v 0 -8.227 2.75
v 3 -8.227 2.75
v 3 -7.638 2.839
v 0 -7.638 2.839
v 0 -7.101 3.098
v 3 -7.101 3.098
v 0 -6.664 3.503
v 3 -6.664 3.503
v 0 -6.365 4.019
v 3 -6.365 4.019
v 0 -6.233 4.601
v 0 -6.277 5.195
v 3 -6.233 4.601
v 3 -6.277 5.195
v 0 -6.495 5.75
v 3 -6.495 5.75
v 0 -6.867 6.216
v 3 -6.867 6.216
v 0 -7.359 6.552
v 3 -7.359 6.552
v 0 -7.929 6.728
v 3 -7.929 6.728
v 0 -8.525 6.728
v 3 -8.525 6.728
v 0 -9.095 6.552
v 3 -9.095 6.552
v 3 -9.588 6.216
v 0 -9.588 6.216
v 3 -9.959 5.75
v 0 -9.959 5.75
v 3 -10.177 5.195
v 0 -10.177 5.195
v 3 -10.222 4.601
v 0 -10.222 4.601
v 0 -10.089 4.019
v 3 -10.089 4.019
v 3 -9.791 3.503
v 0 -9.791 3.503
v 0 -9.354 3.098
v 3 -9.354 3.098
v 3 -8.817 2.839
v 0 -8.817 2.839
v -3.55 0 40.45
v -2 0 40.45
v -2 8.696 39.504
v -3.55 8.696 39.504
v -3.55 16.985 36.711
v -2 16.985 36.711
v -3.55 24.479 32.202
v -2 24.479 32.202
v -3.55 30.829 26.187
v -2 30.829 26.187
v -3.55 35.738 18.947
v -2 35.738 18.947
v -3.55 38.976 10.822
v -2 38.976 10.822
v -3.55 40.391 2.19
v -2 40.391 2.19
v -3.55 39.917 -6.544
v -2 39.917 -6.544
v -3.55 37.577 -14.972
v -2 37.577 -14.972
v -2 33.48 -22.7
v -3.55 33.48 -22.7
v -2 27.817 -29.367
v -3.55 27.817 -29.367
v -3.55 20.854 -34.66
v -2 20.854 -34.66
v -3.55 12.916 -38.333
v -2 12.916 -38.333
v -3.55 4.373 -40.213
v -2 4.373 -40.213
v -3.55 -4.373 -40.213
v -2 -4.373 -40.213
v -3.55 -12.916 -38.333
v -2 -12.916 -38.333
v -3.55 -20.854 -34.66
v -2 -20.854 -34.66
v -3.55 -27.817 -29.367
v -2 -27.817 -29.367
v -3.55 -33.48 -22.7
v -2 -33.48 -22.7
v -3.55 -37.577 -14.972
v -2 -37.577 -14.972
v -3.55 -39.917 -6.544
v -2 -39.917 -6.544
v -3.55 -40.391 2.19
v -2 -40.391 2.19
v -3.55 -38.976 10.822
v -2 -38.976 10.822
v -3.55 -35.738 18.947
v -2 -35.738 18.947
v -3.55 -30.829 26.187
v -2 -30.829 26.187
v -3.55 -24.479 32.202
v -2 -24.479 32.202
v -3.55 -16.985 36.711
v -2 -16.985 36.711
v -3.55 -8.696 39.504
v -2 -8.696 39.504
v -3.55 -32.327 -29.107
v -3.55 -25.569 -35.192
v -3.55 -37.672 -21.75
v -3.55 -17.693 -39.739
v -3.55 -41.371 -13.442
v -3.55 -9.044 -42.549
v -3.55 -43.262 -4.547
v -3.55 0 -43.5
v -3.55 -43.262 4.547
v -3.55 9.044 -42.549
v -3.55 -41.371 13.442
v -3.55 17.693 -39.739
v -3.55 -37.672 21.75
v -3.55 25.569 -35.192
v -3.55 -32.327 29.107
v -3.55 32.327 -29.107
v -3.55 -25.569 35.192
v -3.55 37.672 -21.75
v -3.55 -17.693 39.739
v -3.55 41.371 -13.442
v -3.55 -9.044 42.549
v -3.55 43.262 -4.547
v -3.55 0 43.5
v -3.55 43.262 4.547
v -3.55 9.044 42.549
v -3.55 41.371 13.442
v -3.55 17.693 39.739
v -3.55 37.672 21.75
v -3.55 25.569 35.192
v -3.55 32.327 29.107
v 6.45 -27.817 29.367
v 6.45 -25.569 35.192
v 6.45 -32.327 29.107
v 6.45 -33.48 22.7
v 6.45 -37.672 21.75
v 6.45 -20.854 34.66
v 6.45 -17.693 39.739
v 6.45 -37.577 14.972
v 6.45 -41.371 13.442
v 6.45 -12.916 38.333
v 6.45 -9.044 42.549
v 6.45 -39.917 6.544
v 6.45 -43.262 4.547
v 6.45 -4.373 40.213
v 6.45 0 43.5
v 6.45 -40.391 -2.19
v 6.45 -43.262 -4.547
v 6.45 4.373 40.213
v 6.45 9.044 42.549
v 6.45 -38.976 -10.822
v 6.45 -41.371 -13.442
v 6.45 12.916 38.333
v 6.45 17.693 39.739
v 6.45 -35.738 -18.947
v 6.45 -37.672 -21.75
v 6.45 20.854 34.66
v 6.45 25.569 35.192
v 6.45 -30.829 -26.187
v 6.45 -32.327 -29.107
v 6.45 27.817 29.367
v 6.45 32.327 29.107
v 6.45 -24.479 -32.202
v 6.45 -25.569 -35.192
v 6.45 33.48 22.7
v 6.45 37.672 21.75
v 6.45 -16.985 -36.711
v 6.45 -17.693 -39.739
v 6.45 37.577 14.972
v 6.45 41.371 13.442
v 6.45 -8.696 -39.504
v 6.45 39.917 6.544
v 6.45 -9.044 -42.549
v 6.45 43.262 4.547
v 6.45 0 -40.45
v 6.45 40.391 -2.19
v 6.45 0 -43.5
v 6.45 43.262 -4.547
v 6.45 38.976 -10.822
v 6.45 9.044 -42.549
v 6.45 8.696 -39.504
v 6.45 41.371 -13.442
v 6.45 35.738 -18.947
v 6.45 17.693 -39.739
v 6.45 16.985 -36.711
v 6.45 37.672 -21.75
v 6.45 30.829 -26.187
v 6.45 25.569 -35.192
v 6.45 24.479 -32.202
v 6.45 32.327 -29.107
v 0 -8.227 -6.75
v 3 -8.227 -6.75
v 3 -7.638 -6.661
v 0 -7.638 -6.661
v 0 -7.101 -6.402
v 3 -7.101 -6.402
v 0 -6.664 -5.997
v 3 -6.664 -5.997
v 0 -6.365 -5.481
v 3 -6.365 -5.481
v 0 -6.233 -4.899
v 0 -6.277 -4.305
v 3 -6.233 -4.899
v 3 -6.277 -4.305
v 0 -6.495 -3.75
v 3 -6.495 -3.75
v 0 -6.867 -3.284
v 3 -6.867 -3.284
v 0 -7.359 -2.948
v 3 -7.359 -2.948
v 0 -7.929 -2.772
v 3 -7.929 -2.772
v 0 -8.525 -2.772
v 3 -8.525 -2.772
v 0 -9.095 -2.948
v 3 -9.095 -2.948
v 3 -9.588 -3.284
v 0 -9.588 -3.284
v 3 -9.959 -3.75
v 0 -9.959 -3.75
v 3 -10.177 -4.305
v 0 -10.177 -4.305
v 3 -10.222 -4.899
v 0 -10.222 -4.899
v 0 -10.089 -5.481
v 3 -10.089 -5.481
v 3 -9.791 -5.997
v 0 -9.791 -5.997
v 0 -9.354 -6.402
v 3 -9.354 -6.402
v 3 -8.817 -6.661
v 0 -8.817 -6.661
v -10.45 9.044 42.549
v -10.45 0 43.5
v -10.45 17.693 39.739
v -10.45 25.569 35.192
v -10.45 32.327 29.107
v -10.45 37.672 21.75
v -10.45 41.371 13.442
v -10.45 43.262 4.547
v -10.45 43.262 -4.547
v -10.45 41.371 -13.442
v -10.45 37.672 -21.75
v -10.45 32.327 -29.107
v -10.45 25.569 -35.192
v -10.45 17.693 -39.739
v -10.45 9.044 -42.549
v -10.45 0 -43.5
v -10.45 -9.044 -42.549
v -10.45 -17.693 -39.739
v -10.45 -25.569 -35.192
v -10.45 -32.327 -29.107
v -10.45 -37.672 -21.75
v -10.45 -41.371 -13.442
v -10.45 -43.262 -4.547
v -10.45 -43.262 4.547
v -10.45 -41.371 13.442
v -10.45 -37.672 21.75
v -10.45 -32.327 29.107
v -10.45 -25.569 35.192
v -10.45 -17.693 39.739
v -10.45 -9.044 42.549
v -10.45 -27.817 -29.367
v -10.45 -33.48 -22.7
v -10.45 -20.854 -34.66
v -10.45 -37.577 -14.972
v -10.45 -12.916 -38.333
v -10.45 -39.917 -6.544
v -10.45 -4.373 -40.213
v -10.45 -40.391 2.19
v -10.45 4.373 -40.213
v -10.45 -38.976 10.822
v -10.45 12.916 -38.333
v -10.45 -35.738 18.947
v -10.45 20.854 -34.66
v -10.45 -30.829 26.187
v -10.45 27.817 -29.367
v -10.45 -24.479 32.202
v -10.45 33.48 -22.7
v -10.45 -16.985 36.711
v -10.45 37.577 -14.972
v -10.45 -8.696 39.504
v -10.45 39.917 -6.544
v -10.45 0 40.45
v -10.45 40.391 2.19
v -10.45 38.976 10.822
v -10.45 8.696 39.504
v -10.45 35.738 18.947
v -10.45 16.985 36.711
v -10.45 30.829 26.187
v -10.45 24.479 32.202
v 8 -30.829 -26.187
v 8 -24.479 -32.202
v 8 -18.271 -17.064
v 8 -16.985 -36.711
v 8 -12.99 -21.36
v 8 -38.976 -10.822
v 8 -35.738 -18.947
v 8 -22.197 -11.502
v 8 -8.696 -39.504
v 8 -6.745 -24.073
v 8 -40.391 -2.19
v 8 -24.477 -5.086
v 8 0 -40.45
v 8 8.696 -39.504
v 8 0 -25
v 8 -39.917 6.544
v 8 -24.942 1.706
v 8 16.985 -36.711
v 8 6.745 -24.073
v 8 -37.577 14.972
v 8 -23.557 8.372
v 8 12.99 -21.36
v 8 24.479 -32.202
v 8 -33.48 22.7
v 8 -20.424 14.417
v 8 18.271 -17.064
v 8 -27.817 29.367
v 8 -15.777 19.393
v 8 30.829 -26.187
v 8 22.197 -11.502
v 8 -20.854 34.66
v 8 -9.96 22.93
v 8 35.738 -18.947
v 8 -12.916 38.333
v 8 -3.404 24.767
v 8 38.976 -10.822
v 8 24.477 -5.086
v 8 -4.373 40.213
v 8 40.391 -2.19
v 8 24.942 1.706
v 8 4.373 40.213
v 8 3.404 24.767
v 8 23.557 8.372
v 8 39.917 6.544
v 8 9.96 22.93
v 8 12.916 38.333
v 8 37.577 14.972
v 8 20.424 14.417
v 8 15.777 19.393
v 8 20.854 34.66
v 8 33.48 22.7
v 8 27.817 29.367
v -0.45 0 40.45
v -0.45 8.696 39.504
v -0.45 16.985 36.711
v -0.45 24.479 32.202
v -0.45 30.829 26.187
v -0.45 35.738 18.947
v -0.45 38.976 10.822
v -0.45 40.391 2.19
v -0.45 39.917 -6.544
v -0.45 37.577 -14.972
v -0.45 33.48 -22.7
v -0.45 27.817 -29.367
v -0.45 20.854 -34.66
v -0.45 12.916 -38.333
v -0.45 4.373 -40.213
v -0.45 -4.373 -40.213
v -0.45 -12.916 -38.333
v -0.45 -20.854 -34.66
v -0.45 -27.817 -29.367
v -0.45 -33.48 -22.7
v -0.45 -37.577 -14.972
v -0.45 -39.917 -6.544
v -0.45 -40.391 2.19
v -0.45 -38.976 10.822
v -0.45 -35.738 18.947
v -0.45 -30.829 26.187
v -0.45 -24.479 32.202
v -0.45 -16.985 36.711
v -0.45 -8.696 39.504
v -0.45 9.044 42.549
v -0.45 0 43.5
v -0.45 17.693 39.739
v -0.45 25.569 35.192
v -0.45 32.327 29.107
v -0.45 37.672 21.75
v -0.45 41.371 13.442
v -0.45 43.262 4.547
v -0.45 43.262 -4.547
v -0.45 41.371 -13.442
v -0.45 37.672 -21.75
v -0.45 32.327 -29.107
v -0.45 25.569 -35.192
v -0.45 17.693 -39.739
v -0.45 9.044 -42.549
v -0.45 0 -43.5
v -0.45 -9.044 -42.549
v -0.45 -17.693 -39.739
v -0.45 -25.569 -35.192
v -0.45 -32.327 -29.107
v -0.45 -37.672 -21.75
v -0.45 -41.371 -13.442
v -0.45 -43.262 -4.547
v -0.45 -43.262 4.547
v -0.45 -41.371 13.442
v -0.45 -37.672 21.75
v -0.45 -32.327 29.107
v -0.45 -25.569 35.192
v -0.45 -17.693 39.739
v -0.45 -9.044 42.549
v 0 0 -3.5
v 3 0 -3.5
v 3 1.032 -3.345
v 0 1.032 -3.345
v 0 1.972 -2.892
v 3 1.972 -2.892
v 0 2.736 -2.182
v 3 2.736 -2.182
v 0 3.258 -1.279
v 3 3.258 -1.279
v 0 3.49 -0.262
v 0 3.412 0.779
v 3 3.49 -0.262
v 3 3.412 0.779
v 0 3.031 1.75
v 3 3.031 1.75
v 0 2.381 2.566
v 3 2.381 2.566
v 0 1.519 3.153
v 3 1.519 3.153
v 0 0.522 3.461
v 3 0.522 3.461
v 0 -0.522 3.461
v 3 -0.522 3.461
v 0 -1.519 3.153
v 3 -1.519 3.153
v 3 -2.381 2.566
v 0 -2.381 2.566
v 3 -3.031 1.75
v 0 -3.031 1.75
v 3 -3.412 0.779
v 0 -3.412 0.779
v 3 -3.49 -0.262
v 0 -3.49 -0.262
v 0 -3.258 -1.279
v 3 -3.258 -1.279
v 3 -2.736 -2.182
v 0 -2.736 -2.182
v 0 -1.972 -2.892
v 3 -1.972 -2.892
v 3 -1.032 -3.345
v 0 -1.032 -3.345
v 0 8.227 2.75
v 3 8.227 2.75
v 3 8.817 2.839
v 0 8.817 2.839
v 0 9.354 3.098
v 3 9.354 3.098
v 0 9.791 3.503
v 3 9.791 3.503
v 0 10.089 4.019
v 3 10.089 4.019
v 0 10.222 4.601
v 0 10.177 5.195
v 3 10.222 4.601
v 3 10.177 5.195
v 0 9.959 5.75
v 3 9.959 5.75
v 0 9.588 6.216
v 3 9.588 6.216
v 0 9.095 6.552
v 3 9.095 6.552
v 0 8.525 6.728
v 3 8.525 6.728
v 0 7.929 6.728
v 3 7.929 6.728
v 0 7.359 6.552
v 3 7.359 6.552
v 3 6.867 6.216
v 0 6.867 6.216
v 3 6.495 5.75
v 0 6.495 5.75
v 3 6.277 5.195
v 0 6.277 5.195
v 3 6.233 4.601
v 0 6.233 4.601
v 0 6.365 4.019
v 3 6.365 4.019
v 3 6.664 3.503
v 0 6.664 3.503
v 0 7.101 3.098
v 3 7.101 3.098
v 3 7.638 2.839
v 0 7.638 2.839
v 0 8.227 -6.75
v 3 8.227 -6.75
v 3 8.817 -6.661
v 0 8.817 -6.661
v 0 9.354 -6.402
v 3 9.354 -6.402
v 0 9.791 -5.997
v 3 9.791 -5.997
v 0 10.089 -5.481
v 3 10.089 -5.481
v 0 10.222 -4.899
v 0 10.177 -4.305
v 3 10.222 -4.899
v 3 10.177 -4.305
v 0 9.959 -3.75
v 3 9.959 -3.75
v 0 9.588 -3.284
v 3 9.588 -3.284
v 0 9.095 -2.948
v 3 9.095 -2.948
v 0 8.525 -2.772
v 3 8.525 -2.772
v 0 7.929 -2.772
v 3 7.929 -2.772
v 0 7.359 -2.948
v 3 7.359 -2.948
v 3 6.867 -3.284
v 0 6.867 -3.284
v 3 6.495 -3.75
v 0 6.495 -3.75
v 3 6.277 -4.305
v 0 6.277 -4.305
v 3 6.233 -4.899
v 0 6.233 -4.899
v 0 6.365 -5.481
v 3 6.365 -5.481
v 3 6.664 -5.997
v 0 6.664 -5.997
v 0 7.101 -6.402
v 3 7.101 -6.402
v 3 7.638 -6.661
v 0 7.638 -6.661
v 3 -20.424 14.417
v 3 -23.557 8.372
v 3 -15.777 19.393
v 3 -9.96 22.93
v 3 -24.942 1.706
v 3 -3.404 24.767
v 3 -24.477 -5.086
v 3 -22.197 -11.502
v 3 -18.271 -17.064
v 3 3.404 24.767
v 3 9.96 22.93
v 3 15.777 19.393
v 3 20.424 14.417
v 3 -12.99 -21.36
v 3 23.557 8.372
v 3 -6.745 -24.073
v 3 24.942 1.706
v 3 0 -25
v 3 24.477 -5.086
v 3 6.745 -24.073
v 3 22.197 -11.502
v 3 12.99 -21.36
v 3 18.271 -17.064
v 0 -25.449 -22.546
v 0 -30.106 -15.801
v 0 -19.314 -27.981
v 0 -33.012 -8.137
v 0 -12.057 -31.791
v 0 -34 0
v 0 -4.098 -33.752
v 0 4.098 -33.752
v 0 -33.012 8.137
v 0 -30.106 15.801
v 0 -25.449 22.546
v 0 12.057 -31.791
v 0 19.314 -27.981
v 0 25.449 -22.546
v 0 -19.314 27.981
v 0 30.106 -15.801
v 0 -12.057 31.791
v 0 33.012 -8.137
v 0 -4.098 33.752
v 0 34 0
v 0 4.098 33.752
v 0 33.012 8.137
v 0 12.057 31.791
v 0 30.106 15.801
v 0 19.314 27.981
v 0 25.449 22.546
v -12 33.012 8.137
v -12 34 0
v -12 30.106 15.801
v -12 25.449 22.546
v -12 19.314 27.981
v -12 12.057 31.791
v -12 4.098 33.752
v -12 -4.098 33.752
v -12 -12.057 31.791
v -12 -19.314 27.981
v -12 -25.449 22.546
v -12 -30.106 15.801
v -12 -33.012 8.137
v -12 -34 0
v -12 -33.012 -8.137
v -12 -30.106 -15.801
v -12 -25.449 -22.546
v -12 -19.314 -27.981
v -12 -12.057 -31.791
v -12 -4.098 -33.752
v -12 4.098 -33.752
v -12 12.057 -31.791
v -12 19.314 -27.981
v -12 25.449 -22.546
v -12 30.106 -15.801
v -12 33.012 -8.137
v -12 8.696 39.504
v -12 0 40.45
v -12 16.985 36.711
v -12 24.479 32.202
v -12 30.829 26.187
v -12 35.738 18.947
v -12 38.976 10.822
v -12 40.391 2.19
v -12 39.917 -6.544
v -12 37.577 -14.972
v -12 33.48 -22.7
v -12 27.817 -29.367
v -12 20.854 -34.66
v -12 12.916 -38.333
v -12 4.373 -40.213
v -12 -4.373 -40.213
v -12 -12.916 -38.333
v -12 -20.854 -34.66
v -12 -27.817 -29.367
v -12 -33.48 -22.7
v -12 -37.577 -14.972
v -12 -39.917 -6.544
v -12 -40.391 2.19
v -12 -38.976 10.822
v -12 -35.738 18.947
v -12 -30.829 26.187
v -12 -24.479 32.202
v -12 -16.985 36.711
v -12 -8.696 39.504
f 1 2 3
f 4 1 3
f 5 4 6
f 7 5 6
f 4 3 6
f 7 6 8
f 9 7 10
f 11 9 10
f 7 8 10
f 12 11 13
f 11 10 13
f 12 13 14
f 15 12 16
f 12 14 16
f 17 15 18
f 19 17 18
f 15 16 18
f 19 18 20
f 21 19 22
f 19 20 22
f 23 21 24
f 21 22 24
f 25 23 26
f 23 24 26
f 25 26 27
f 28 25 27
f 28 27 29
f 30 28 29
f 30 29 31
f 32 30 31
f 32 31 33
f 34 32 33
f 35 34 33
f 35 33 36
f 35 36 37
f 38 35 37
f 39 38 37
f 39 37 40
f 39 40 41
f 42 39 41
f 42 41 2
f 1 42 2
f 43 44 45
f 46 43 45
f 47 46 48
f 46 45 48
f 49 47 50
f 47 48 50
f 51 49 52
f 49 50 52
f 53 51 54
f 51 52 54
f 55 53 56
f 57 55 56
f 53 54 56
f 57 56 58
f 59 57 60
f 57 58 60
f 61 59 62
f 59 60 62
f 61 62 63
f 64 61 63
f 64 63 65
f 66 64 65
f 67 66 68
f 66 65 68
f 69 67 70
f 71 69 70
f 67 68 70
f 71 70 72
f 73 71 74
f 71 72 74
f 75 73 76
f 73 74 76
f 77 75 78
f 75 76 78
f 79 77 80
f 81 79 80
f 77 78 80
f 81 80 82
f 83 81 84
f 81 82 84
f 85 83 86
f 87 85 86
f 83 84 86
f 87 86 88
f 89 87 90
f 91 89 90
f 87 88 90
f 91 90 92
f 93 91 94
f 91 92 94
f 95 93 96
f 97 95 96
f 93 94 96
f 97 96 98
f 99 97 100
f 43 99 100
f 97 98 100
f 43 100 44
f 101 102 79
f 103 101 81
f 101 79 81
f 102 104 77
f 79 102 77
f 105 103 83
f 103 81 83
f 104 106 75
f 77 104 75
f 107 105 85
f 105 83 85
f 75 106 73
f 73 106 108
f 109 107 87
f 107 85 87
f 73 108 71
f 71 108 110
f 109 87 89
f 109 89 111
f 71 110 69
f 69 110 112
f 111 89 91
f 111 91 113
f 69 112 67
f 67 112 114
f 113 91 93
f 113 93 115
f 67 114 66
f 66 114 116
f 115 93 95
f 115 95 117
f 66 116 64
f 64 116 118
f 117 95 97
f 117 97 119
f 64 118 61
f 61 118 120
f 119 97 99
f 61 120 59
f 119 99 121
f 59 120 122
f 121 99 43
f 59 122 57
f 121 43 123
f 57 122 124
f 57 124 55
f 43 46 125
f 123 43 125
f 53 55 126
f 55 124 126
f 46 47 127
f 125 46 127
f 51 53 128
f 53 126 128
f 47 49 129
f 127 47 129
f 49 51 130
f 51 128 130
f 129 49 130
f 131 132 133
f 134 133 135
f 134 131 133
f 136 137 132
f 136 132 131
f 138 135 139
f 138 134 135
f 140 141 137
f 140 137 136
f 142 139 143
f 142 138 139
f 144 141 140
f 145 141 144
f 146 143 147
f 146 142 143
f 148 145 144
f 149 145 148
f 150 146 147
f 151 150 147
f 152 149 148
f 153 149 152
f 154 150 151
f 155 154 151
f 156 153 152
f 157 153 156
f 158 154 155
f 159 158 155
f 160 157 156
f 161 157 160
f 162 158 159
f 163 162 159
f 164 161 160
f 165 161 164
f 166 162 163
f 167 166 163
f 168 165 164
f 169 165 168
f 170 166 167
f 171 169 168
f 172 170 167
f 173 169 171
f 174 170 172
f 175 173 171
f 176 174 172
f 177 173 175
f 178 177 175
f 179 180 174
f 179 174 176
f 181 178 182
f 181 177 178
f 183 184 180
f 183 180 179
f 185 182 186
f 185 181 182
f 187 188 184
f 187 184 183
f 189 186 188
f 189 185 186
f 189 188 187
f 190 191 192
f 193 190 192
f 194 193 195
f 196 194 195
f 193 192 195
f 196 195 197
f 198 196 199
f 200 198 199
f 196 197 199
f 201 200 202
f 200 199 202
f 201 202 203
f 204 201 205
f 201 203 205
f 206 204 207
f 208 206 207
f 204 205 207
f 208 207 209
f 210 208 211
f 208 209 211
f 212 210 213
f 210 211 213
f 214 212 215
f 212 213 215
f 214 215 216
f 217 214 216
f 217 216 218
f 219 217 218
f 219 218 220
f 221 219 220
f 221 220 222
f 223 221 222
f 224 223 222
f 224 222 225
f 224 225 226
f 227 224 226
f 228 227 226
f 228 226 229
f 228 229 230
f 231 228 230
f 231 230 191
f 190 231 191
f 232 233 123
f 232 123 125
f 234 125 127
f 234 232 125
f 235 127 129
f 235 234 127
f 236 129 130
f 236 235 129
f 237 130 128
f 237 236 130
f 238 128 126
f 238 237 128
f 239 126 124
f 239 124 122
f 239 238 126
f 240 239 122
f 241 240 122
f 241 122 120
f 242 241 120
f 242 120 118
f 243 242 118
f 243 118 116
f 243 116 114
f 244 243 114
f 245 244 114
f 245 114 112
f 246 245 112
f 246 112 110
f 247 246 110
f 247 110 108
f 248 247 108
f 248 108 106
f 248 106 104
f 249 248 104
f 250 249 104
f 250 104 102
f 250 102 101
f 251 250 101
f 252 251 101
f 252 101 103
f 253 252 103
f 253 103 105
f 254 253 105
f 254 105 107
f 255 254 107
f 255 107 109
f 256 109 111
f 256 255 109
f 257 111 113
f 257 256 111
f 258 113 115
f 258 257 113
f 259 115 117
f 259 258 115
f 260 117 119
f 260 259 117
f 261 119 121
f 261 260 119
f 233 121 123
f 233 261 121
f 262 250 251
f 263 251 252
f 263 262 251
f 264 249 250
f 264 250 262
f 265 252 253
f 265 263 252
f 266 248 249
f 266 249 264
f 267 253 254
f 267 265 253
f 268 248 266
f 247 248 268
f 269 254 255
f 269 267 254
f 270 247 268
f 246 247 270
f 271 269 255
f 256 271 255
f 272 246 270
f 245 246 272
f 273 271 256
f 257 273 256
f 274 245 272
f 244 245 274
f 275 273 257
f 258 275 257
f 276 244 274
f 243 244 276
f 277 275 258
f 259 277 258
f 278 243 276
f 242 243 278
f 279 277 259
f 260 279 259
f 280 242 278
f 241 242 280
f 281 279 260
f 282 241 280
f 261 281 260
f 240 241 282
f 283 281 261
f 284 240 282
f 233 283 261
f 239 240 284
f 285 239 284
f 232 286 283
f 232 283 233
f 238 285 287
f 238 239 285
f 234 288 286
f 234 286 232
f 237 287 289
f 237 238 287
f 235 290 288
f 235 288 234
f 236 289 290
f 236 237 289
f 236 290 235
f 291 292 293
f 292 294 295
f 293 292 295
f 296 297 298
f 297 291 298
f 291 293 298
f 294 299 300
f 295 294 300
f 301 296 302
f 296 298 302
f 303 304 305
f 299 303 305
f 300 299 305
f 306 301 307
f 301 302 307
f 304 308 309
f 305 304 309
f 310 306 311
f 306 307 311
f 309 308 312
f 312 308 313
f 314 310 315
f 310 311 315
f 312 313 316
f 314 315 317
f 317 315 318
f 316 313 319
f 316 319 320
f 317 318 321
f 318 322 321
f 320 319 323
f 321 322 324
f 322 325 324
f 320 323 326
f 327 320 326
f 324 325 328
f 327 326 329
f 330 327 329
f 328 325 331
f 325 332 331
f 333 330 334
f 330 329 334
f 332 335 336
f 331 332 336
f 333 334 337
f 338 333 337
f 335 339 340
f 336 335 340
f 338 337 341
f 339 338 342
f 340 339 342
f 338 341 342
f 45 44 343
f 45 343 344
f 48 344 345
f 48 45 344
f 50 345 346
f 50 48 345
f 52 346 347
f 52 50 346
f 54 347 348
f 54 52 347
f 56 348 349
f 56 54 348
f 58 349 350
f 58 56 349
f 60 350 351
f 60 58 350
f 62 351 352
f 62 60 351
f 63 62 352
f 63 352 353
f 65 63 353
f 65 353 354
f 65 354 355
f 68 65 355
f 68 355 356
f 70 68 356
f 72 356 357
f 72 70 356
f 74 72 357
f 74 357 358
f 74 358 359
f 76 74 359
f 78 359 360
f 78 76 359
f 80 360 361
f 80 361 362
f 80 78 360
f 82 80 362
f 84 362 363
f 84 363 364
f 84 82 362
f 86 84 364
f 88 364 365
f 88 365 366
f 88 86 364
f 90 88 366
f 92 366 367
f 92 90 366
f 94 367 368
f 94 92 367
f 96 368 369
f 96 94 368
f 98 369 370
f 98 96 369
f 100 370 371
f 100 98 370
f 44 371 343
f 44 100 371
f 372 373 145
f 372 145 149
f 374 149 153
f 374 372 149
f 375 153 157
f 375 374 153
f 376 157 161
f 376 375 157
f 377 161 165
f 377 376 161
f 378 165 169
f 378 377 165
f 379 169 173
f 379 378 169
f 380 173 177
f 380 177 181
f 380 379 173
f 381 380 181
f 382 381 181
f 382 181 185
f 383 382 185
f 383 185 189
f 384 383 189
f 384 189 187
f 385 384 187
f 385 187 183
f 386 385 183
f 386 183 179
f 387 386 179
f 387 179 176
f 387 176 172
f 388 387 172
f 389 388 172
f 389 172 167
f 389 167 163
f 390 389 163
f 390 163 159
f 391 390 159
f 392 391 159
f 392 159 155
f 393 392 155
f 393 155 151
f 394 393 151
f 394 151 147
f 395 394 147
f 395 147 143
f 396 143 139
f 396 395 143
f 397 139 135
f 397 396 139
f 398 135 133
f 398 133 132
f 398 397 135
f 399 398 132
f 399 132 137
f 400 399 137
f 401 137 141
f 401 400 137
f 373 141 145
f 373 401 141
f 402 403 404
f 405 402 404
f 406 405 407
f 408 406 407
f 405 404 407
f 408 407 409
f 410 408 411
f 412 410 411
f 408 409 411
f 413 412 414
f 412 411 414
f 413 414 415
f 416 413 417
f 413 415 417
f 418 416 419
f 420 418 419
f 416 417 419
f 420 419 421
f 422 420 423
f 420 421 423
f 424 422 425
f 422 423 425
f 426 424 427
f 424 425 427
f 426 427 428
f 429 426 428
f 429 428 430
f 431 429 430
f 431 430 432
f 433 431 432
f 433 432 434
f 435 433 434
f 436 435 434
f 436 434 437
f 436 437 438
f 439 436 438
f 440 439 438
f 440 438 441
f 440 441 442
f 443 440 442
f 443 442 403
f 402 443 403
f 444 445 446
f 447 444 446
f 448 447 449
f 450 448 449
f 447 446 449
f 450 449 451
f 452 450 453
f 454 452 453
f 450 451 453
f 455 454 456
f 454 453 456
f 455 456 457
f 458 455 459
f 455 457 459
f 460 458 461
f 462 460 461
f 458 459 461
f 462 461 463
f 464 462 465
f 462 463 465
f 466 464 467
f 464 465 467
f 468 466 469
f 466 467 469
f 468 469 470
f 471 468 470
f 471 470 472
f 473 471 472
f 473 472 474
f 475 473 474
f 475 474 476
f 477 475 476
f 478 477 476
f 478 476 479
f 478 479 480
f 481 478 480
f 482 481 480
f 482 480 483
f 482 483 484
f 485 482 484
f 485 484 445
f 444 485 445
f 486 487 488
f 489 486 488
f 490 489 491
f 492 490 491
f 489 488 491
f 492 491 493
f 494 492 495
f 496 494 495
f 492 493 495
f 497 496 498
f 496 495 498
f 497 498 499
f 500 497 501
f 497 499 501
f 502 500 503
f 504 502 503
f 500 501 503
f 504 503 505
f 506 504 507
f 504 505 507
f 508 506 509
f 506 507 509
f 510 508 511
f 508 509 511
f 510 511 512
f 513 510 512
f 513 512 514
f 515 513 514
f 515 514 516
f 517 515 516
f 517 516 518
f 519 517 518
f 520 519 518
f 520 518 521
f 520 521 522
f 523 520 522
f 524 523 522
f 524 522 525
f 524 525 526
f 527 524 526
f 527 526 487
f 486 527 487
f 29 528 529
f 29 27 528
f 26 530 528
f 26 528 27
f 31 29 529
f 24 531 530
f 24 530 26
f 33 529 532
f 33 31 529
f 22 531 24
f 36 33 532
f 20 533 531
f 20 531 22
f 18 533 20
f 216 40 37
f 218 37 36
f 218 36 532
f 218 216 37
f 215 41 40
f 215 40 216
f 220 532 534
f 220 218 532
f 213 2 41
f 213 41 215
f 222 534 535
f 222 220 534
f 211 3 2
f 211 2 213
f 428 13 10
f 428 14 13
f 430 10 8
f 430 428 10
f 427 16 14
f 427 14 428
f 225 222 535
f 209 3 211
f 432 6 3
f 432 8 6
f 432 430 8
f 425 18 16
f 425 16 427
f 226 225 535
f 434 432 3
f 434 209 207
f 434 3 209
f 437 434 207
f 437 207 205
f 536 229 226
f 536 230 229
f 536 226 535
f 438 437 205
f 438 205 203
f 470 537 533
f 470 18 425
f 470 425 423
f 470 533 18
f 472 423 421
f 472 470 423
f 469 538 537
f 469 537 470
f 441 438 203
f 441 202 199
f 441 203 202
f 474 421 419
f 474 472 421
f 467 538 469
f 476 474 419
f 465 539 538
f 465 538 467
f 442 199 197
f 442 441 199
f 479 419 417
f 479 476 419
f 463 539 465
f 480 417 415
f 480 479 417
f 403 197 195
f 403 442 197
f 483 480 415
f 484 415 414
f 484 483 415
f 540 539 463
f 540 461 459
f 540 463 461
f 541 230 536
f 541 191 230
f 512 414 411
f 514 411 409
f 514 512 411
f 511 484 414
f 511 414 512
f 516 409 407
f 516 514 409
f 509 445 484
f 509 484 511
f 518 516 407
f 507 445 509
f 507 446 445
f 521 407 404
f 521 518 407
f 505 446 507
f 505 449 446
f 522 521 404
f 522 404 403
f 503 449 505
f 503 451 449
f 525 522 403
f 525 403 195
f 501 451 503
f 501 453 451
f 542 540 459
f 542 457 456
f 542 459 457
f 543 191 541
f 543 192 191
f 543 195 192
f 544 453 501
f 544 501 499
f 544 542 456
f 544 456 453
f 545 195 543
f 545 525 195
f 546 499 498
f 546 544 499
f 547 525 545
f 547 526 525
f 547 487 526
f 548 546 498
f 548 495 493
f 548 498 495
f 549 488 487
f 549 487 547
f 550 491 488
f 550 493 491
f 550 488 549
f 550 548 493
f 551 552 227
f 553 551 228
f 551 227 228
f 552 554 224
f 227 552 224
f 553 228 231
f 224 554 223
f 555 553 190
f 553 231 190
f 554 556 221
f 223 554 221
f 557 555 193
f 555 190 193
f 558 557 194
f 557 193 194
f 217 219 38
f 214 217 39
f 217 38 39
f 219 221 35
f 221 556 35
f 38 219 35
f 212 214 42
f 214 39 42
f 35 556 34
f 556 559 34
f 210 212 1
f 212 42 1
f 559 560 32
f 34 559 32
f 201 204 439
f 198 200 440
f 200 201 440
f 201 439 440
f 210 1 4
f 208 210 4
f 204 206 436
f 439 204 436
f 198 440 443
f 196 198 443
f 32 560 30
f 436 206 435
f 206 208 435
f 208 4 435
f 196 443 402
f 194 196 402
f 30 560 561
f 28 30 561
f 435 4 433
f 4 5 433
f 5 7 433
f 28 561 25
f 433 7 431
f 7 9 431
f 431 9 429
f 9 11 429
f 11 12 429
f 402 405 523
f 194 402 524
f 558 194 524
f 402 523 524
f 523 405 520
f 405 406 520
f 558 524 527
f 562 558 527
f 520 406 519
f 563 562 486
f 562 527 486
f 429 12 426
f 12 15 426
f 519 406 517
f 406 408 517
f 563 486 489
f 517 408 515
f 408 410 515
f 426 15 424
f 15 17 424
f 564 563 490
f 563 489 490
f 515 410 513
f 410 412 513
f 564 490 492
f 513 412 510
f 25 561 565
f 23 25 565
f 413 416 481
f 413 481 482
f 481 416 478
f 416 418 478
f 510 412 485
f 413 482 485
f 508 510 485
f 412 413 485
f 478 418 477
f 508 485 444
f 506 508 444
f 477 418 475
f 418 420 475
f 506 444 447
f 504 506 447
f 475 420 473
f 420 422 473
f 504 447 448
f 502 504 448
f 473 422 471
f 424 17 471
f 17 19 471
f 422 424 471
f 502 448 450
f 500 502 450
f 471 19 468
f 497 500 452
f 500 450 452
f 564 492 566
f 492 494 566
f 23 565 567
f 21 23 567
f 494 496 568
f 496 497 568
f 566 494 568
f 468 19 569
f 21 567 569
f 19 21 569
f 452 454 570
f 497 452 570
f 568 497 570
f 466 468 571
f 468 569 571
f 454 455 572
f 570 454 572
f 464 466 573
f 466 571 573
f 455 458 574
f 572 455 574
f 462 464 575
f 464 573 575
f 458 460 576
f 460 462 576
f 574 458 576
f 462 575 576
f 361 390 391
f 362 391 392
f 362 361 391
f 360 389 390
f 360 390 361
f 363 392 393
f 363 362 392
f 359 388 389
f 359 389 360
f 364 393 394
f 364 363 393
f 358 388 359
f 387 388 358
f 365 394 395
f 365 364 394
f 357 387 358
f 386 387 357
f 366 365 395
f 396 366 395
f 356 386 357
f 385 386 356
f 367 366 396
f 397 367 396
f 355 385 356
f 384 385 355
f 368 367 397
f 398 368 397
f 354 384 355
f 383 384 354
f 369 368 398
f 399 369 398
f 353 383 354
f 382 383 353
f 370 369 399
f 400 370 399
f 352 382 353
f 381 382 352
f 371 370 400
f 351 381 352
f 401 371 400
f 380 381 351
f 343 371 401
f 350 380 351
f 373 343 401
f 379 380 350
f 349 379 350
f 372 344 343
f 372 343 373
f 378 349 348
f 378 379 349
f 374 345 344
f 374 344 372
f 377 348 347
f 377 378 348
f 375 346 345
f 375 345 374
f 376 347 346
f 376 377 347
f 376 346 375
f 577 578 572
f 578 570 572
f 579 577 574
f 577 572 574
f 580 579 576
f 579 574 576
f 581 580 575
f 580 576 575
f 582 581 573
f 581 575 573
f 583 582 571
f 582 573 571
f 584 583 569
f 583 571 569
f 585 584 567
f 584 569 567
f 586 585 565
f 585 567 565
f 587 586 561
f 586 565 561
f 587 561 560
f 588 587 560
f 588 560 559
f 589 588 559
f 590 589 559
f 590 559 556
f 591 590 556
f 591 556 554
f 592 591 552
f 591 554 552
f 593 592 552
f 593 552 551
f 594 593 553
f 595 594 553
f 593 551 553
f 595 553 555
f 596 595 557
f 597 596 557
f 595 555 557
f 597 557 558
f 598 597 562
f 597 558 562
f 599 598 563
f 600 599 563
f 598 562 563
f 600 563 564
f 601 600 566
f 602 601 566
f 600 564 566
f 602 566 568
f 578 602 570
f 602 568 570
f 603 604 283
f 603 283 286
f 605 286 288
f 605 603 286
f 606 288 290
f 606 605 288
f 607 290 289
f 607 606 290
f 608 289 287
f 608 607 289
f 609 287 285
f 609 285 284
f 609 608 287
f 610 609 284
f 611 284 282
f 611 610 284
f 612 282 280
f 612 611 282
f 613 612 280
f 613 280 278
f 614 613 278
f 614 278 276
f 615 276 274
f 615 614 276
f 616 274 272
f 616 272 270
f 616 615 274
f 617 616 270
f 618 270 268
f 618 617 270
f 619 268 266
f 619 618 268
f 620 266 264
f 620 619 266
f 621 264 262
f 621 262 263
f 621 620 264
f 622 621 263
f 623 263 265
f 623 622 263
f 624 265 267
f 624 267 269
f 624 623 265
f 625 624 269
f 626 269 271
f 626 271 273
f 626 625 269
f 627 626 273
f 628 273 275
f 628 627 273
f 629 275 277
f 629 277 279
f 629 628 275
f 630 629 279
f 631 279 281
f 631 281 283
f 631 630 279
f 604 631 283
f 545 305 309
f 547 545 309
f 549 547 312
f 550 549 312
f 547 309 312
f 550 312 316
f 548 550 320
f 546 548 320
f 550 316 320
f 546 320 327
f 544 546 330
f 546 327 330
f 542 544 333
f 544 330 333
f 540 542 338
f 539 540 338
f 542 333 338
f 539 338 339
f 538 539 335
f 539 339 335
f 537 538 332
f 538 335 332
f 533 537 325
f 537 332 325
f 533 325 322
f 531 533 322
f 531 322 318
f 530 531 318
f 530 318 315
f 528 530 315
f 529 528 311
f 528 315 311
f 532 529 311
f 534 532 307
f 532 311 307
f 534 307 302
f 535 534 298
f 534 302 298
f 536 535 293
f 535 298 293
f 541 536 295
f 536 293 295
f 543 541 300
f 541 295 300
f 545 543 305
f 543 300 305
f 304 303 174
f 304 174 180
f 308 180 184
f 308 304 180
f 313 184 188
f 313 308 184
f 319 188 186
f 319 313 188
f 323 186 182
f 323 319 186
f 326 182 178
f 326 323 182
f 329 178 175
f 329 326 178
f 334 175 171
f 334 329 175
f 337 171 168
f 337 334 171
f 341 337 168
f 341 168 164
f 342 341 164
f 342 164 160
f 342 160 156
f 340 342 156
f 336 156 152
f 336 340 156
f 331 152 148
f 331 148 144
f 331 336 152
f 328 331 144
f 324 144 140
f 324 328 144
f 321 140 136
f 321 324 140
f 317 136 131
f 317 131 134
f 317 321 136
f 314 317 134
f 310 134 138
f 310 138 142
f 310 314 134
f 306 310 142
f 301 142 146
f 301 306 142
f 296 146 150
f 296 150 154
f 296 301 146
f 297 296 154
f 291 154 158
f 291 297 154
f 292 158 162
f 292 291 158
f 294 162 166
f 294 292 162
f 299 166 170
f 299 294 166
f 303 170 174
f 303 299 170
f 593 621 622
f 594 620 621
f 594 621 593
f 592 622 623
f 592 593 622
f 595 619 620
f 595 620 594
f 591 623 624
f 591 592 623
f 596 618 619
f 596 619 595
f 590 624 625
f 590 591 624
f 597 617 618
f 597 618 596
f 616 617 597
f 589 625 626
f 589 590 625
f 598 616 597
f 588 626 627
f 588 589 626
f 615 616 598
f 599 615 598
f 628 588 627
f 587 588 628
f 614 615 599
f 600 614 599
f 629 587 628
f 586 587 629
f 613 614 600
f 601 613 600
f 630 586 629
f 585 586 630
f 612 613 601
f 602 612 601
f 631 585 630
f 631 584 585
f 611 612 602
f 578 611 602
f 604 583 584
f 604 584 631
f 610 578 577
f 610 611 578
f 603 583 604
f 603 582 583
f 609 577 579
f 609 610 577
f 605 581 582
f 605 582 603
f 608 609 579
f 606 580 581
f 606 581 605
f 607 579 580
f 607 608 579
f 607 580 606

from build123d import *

# Parameters (mm, degrees)
ESQUISSE2_W             = 5
ESQUISSE2_H             = 12.5
ESQUISSE3_R             = 2
ENL_V_MAT_EXTRU_1_DEPTH = 36
ESQUISSE4_R             = 3.5
ENL_V_MAT_EXTRU_2_DEPTH = 36
SKETCH1_R               = 40
CUT_EXTRUDE1_DEPTH      = 20
SKETCH2_R               = 40
SKETCH2_R_2             = 39
BOSS_EXTRUDE2_DEPTH     = 15
SKETCH3_R               = 25
CUT_EXTRUDE2_DEPTH      = 5
SKETCH4_R               = 43.5
SKETCH4_R_2             = 40
BOSS_EXTRUDE3_DEPTH     = 20
SKETCH5_R               = 43.5
SKETCH5_R_2             = 40.45
CUT_EXTRUDE3_DEPTH      = 1.55
SKETCH6_R               = 43.5
SKETCH6_R_2             = 40.45
CUT_EXTRUDE4_DEPTH      = 1.55
CUT_EXTRUDE4_DEPTH_BACK = 1.55
SKETCH7_R               = 43.5
SKETCH7_R_2             = 40.45
CUT_EXTRUDE5_DEPTH      = 1.55


with BuildPart() as part:
    # Esquisse1 → Révolution1 (revolve)
    with BuildSketch(Plane.XY):
        Polygon((0, 34), (0, 0), (8, 0), (8, 40), (3, 40), (3, 39), (-27, 39), (-27, 40), (-32, 40), (-32, 34), align=None)
    revolve(axis=Axis((-49.644499027, 0, 0), (1, 0, 0)))

    # Esquisse2 → Enlèvement de matière-Révolution1 (revolve, cut)
    with BuildSketch(Plane.XY):
        with Locations((5.5, 6.25)):
            Rectangle(ESQUISSE2_W, ESQUISSE2_H)
    revolve(axis=Axis((0, 0, 0), (1, 0, 0)), mode=Mode.SUBTRACT)

    # Esquisse3 → Enlèv. mat.-Extru.1 (cut, through all)
    with BuildSketch(Plane(origin=(3, 0, 0), x_dir=(0, 0, -1), z_dir=(1, 0, 0))):
        with Locations((4.75, 8.227241336)):
            Circle(ESQUISSE3_R)
        with Locations((-4.75, 8.227241336)):
            Circle(ESQUISSE3_R)
        with Locations((4.75, -8.227241336)):
            Circle(ESQUISSE3_R)
        with Locations((-4.75, -8.227241336)):
            Circle(ESQUISSE3_R)
    extrude(amount=-ENL_V_MAT_EXTRU_1_DEPTH, mode=Mode.SUBTRACT)

    # Esquisse4 → Enlèv. mat.-Extru.2 (cut, through all)
    with BuildSketch(Plane(origin=(3, 0, 0), x_dir=(0, 0, -1), z_dir=(1, 0, 0))):
        Circle(ESQUISSE4_R)
    extrude(amount=-ENL_V_MAT_EXTRU_2_DEPTH, mode=Mode.SUBTRACT)

    # Sketch1 → Cut-Extrude1 (cut)
    with BuildSketch(Plane.ZY.offset(32)):
        Circle(SKETCH1_R)
    extrude(amount=-CUT_EXTRUDE1_DEPTH, mode=Mode.SUBTRACT)

    # Sketch2 → Boss-Extrude2 (add)
    with BuildSketch(Plane.ZY.offset(-3)):
        Circle(SKETCH2_R)
        Circle(SKETCH2_R_2, mode=Mode.SUBTRACT)
    extrude(amount=BOSS_EXTRUDE2_DEPTH)

    # Sketch3 → Cut-Extrude2 (cut)
    with BuildSketch(Plane(origin=(8, 0, 0), x_dir=(0, 0, -1), z_dir=(1, 0, 0))):
        Circle(SKETCH3_R)
    extrude(amount=-CUT_EXTRUDE2_DEPTH, mode=Mode.SUBTRACT)

    # Sketch4 → Boss-Extrude3 (add)
    with BuildSketch(Plane.ZY.offset(12)):
        Circle(SKETCH4_R)
        Circle(SKETCH4_R_2, mode=Mode.SUBTRACT)
    extrude(amount=-BOSS_EXTRUDE3_DEPTH)

    # Sketch5 → Cut-Extrude3 (cut)
    with BuildSketch(Plane.ZY.offset(12)):
        Circle(SKETCH5_R)
        Circle(SKETCH5_R_2, mode=Mode.SUBTRACT)
    extrude(amount=-CUT_EXTRUDE3_DEPTH, mode=Mode.SUBTRACT)

    # Sketch6 → Cut-Extrude4 (cut, two sides)
    with BuildSketch(Plane.ZY.offset(2)) as cut_extrude4_sk:
        Circle(SKETCH6_R)
        Circle(SKETCH6_R_2, mode=Mode.SUBTRACT)
    extrude(amount=CUT_EXTRUDE4_DEPTH, mode=Mode.SUBTRACT)
    extrude(cut_extrude4_sk.sketch, amount=-CUT_EXTRUDE4_DEPTH_BACK, mode=Mode.SUBTRACT)

    # Sketch7 → Cut-Extrude5 (cut)
    with BuildSketch(Plane(origin=(8, 0, 0), x_dir=(0, 0, -1), z_dir=(1, 0, 0))):
        Circle(SKETCH7_R)
        Circle(SKETCH7_R_2, mode=Mode.SUBTRACT)
    extrude(amount=-CUT_EXTRUDE5_DEPTH, mode=Mode.SUBTRACT)


solid = part.part
